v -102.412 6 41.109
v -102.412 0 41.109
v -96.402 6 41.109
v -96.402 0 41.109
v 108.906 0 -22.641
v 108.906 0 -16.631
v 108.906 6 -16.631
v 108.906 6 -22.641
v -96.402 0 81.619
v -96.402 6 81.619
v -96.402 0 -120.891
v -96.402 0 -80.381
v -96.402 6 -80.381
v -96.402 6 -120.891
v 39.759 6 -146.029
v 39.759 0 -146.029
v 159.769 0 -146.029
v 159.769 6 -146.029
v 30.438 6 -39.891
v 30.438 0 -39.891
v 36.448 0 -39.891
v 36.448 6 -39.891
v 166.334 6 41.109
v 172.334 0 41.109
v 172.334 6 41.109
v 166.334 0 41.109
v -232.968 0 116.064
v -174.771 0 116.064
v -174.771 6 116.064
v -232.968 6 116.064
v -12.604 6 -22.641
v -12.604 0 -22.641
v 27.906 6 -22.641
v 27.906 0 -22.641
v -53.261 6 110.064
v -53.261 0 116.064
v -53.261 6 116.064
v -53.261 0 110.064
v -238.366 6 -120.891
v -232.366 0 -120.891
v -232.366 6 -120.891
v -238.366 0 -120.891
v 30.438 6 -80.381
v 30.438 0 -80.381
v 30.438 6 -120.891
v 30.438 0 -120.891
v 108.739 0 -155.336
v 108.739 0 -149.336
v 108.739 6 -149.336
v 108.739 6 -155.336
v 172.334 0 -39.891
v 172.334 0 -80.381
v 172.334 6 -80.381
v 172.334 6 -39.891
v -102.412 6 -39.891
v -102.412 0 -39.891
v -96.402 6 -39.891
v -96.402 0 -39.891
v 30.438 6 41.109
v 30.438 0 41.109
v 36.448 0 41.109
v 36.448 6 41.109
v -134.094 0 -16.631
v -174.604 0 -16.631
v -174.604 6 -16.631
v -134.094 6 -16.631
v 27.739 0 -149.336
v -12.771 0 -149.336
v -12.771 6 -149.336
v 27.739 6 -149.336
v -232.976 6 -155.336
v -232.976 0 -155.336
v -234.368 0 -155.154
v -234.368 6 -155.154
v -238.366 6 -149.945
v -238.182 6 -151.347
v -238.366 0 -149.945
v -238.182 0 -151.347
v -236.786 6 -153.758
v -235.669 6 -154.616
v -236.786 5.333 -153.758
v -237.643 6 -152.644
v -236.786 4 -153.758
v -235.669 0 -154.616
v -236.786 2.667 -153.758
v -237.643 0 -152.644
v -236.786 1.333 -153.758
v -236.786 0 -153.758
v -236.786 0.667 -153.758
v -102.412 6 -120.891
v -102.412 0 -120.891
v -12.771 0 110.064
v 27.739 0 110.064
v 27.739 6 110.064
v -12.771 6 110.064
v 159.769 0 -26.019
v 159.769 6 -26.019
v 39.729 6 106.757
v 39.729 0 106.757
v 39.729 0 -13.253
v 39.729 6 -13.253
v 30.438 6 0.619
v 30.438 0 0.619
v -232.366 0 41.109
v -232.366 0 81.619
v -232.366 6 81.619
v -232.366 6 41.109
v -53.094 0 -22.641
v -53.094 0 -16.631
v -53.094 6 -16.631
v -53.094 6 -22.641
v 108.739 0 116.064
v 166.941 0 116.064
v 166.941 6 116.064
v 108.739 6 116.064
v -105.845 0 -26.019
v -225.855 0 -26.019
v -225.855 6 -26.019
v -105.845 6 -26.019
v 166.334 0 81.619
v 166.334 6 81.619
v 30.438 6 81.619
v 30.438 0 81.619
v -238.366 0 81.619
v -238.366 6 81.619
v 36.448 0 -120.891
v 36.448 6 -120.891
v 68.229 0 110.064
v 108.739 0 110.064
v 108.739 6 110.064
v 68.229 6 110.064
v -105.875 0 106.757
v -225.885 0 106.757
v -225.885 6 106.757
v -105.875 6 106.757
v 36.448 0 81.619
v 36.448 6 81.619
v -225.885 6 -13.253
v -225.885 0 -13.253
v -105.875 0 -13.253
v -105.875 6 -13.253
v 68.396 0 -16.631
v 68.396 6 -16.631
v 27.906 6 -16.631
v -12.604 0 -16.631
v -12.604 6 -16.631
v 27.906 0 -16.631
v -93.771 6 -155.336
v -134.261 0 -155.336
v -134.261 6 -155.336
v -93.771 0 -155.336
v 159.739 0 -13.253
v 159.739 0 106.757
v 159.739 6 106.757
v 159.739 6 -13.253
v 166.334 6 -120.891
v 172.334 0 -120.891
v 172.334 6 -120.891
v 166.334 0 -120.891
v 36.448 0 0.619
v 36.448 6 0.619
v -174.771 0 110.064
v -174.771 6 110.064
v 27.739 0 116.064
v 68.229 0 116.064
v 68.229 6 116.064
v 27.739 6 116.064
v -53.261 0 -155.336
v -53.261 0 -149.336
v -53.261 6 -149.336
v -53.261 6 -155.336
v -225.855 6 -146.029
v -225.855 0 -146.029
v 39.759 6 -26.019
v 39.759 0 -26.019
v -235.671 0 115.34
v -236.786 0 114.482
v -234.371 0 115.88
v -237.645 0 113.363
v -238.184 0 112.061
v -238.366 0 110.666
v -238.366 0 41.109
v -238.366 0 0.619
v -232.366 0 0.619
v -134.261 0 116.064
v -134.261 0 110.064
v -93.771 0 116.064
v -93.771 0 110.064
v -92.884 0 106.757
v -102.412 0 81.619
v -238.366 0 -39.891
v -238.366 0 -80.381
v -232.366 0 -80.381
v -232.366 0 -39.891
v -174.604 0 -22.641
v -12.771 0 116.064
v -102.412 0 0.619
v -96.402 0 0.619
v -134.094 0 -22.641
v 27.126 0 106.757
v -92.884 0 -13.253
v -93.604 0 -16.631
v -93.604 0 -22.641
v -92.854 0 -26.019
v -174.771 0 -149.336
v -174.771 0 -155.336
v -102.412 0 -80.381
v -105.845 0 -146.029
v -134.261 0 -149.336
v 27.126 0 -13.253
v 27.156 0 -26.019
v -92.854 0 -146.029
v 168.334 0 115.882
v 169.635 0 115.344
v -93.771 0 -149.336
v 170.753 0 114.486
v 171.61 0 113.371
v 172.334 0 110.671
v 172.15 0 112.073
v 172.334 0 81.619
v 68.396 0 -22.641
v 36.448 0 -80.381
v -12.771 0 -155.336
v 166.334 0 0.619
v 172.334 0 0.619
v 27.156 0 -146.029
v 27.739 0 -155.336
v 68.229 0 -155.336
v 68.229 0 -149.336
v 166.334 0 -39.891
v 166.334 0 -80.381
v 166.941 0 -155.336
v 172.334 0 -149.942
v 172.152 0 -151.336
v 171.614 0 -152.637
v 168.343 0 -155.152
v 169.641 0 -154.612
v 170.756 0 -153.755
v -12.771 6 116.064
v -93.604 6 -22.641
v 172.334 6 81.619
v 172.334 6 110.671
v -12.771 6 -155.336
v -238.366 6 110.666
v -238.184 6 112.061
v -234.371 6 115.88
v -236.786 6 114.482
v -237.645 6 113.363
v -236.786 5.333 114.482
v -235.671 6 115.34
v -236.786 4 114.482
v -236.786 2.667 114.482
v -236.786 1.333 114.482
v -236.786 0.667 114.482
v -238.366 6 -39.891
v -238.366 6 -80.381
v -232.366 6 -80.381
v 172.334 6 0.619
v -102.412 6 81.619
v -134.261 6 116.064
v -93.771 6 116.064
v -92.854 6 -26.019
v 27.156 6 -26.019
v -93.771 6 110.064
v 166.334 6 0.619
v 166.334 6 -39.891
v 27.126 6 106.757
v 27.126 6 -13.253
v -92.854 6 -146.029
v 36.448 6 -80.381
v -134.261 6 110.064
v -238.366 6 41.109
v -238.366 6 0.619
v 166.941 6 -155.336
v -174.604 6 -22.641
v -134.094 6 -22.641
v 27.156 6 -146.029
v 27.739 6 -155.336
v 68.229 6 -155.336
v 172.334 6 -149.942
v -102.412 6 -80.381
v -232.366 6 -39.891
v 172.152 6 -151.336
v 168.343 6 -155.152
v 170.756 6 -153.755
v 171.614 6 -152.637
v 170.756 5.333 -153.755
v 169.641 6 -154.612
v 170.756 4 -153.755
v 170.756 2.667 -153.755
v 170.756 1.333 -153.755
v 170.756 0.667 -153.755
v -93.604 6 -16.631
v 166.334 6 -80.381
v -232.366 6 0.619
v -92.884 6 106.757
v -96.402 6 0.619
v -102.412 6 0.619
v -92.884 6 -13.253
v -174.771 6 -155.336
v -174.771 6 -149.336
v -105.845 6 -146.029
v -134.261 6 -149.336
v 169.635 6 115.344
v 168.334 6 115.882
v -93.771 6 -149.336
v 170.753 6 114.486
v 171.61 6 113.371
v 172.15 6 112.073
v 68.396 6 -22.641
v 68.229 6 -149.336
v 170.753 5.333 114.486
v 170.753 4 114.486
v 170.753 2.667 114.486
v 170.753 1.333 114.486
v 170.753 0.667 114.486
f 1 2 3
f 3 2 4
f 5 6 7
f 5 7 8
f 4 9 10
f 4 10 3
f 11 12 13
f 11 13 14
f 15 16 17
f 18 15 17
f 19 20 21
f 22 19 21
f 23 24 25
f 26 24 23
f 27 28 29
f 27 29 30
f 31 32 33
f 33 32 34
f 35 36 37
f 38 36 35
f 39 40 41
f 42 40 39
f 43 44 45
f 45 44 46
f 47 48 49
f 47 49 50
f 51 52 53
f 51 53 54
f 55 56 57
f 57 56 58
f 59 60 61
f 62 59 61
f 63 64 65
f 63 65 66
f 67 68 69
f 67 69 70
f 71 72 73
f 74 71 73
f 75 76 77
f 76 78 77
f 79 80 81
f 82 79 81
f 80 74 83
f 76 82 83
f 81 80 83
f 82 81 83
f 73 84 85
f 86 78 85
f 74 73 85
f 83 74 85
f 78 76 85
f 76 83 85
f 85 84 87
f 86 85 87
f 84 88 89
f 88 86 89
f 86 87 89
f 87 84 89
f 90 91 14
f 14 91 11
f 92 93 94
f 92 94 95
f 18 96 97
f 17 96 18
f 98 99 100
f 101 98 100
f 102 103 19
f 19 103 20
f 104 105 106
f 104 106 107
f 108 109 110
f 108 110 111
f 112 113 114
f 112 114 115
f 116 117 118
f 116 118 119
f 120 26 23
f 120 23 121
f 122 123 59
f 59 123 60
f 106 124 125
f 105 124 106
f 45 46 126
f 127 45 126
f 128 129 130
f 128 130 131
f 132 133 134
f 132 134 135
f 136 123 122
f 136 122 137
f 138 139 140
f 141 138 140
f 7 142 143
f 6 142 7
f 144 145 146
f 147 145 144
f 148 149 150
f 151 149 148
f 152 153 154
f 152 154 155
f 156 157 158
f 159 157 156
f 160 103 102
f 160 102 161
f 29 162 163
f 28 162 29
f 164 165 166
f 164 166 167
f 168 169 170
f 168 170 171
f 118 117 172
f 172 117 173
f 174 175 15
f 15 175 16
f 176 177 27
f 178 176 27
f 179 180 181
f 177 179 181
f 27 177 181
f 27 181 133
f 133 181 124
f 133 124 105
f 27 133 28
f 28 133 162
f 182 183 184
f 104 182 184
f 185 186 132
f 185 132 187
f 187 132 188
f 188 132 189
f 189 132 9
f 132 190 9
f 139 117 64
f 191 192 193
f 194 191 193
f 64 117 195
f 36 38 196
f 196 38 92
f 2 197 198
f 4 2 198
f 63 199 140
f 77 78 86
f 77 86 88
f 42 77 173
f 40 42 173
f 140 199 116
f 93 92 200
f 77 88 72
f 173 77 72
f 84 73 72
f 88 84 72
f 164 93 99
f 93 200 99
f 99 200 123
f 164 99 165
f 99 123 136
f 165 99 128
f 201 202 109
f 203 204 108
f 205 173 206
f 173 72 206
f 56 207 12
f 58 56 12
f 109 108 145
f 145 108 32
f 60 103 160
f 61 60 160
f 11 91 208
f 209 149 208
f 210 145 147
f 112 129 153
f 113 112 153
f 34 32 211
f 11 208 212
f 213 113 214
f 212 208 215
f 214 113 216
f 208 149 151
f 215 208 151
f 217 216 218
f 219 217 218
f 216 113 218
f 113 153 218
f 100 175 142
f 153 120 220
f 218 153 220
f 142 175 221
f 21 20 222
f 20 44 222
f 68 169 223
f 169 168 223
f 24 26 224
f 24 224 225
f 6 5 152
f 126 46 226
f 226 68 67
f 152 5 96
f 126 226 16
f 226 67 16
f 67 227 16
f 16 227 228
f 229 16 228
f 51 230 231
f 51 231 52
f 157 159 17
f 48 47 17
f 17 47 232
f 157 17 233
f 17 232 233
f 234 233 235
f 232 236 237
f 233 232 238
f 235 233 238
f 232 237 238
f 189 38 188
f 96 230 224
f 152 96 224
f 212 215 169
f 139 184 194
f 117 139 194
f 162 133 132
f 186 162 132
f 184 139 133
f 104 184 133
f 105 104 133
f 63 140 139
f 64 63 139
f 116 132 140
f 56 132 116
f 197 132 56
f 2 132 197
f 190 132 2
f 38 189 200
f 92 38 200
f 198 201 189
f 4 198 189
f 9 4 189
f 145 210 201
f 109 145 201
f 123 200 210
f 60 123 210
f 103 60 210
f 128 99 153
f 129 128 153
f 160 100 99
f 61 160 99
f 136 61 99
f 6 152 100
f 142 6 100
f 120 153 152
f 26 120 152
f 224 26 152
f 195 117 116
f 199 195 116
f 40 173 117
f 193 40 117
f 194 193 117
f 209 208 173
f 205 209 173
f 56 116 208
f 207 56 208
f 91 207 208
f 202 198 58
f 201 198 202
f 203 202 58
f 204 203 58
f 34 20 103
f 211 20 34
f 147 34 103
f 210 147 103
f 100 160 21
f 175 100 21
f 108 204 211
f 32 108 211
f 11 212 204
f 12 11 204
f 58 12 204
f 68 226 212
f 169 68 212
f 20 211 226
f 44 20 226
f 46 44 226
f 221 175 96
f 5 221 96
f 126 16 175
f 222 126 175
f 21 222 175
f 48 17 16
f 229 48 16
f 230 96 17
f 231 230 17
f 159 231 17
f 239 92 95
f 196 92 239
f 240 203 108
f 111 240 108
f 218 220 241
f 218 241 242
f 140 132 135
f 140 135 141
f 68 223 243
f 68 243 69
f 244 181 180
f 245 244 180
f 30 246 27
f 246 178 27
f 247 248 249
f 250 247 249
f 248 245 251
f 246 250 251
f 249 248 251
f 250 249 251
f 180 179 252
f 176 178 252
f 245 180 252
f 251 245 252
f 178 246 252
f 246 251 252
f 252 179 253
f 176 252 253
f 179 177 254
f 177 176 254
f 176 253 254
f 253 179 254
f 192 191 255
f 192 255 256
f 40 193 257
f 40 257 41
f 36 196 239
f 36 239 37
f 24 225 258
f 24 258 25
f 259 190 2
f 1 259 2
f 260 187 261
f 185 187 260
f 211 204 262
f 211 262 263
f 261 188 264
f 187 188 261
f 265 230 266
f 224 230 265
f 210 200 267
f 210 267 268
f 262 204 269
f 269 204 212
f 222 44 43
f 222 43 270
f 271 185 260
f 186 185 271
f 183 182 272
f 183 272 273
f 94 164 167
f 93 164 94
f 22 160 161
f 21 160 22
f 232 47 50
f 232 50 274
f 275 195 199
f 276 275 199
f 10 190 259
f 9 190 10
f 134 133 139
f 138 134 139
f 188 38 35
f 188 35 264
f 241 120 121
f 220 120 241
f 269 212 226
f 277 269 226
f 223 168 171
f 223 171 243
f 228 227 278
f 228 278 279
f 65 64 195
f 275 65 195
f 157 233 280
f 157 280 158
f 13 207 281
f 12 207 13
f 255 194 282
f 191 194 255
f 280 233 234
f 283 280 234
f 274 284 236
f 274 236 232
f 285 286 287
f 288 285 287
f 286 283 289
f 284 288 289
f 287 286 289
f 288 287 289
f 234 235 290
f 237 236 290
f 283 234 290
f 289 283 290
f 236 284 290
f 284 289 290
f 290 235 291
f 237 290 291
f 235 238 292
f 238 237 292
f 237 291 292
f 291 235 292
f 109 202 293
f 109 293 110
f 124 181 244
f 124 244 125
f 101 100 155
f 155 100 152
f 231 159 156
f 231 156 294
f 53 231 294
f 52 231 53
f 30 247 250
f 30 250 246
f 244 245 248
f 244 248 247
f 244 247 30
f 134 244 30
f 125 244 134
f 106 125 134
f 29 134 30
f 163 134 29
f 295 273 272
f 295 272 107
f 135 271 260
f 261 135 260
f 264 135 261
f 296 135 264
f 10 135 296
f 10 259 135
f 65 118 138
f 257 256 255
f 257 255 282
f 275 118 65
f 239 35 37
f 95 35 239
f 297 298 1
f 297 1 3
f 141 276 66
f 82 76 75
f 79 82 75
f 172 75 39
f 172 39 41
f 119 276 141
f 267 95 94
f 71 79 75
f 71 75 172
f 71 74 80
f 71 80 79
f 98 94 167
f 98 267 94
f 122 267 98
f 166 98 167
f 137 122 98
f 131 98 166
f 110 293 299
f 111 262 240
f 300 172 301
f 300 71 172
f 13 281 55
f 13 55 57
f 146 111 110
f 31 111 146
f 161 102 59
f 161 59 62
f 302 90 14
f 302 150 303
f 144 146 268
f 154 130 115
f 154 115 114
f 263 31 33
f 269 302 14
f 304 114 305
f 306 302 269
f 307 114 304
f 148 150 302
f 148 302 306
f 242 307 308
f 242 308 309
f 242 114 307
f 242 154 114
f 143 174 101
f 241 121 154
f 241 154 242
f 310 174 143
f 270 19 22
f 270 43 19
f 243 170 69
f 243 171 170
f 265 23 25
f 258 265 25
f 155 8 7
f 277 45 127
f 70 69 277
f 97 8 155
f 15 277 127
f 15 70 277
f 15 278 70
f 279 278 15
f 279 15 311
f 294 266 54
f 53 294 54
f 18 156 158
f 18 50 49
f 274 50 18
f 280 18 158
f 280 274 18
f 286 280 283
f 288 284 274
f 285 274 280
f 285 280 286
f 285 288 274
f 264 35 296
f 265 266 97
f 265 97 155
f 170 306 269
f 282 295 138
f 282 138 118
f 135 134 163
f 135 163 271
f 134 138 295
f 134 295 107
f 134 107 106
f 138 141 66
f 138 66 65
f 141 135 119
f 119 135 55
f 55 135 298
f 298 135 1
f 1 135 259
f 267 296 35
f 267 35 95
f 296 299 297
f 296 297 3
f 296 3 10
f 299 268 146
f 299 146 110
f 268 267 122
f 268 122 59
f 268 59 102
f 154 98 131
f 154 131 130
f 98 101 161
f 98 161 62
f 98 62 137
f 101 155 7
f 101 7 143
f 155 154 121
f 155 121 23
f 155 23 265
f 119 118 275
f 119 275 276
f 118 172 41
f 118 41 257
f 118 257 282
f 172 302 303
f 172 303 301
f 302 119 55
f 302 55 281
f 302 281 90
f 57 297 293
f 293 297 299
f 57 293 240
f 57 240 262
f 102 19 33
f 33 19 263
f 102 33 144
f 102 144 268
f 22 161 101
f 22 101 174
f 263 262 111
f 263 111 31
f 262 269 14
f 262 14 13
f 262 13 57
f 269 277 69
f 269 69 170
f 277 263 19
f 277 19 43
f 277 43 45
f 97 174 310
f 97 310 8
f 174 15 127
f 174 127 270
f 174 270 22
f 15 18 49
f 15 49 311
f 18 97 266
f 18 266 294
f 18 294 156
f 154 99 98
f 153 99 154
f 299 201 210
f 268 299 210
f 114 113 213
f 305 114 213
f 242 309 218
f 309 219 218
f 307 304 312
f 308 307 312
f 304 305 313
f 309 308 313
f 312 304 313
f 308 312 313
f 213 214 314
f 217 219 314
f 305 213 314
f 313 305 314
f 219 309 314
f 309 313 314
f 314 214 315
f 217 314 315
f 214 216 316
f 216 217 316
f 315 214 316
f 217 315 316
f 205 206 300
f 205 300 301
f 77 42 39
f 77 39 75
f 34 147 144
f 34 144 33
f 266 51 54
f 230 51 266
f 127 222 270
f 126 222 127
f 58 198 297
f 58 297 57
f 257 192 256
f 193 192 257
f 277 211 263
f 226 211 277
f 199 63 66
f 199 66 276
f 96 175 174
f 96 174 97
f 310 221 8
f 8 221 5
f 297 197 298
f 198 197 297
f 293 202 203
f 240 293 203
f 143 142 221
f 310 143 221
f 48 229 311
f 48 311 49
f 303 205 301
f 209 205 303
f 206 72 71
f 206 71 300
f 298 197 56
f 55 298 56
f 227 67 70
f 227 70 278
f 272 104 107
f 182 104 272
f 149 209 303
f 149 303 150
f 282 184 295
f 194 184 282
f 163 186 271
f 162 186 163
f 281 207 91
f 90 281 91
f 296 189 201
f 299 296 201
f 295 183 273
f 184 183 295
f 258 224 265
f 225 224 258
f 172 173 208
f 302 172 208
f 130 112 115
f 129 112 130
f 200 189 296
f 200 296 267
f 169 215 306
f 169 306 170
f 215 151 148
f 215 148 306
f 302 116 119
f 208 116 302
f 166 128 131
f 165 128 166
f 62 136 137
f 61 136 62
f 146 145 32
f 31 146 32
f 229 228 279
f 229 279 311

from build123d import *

# Parameters (mm, degrees)
SKETCH1_W                     = 600
SKETCH1_H                     = 400
BOSS_EXTRUDE1_DEPTH           = 6
CUT_EXTRUDE_THIN1_START       = -6
CUT_EXTRUDE_THIN1_OUTLINE_W   = 600
CUT_EXTRUDE_THIN1_OUTLINE_H   = 400
CUT_EXTRUDE_THIN1_OUTLINE_W_2 = 120.00999997
CUT_EXTRUDE_THIN1_OUTLINE_H_2 = 120.00999997
CUT_EXTRUDE_THIN1_OUTLINE_W_3 = 6.010030683
CUT_EXTRUDE_THIN1_OUTLINE_H_3 = 40.510001116
CUT_EXTRUDE_THIN1_OUTLINE_H_4 = 40.510001117
CUT_EXTRUDE_THIN1_OUTLINE_W_4 = 40.510001117
CUT_EXTRUDE_THIN1_OUTLINE_H_5 = 6.010000165
CUT_EXTRUDE_THIN1_OUTLINE_W_5 = 40.510001116
CUT_EXTRUDE_THIN1_DEPTH       = 6


# Read off the part's stored shape, not the designer's step: Cut-Extrude-Thin1
with BuildPart() as part:
    # Sketch1 → Boss-Extrude1 (new body)
    with BuildSketch(Plane(origin=(0, 0, 0), x_dir=(1, 0, 0), z_dir=(0, 1, 0))):
        Rectangle(SKETCH1_W, SKETCH1_H)
    extrude(amount=BOSS_EXTRUDE1_DEPTH)

    # Cut-Extrude-Thin1 outline → Cut-Extrude-Thin1 (cut)
    # profile 1 of 17: a face of its own
    with BuildSketch(Plane(origin=(0, 6, 0), x_dir=(1, 0, 0), z_dir=(0, 1, 0)).offset(CUT_EXTRUDE_THIN1_START)):
        Rectangle(CUT_EXTRUDE_THIN1_OUTLINE_W, CUT_EXTRUDE_THIN1_OUTLINE_H)
        with BuildLine():
            add(Edge.make_bspline(
                [(-238.36591917, -110.666330439), (-238.36591917, -111.022718254), (-238.331611138, -111.373302275), (-238.229439172, -111.890599849), (-238.186888618, -112.061595598), (-238.084359635, -112.40063887), (-238.024094249, -112.569133555), (-237.820904778, -113.059142484), (-237.654940907, -113.36891683), (-237.263040055, -113.955242515), (-237.035095444, -114.232830805), (-236.537438909, -114.730832851), (-236.266010557, -114.954536306), (-235.676648855, -115.349887512), (-235.363009478, -115.517926842), (-234.714230084, -115.787625448), (-234.374802575, -115.891216057), (-233.677199742, -116.029834842), (-233.324541074, -116.06414949), (-232.96810012, -116.06414949)],
                knots=[0, 0, 0, 0, 0.125, 0.125, 0.1875, 0.1875, 0.25, 0.25, 0.375, 0.375, 0.5, 0.5, 0.625, 0.625, 0.75, 0.75, 0.875, 0.875, 1, 1, 1, 1], degree=3))
            Line((-238.36591917, -110.666330439), (-238.36591917, -81.619146709))
            Line((-238.36591917, -81.619146709), (-232.365919004, -81.619146709))
            Line((-232.365919004, -81.619146709), (-232.365919004, -41.109145592))
            Line((-232.365919004, -41.109145592), (-238.36591917, -41.109145592))
            Line((-238.36591917, -41.109145592), (-238.36591917, -0.619144476))
            Line((-238.36591917, -0.619144476), (-232.365919004, -0.619144476))
            Line((-232.365919004, -0.619144476), (-232.365919004, 39.890856641))
            Line((-232.365919004, 39.890856641), (-238.36591917, 39.890856641))
            Line((-238.36591917, 39.890856641), (-238.36591917, 80.380857757))
            Line((-238.36591917, 80.380857757), (-232.365919004, 80.380857757))
            Line((-232.365919004, 80.380857757), (-232.365919004, 120.890858873))
            Line((-232.365919004, 120.890858873), (-238.36591917, 120.890858873))
            Line((-238.36591917, 120.890858873), (-238.36591917, 149.945450012))
            add(Edge.make_bspline(
                [(-232.975507527, 155.335861654), (-233.331406272, 155.335861654), (-233.681509188, 155.301600704), (-234.198096877, 155.199568948), (-234.368857969, 155.157076787), (-234.707435973, 155.054688504), (-234.875699433, 154.99450582), (-235.365035925, 154.791595185), (-235.674385168, 154.625859065), (-236.259906241, 154.234496016), (-236.537113597, 154.006864213), (-237.034432237, 153.50989061), (-237.257828705, 153.238834738), (-237.652637373, 152.650281815), (-237.820446103, 152.337072845), (-238.089774603, 151.689183769), (-238.193223055, 151.350222055), (-238.331651613, 150.653576539), (-238.36591917, 150.301401824), (-238.36591917, 149.945450012)],
                knots=[0, 0, 0, 0, 0.125, 0.125, 0.1875, 0.1875, 0.25, 0.25, 0.375, 0.375, 0.5, 0.5, 0.625, 0.625, 0.75, 0.75, 0.875, 0.875, 1, 1, 1, 1], degree=3))
            Line((-232.975507527, 155.335861654), (-174.770917874, 155.335861654))
            Line((-174.770917874, 155.335861654), (-174.770917874, 149.335861489))
            Line((-174.770917874, 149.335861489), (-134.260912943, 149.335861489))
            Line((-134.260912943, 149.335861489), (-134.260912943, 155.335861654))
            Line((-134.260912943, 155.335861654), (-93.770919456, 155.335861654))
            Line((-93.770919456, 155.335861654), (-93.770919456, 149.335861489))
            Line((-93.770919456, 149.335861489), (-53.26091834, 149.335861489))
            Line((-53.26091834, 149.335861489), (-53.26091834, 155.335861654))
            Line((-53.26091834, 155.335861654), (-12.770917223, 155.335861654))
            Line((-12.770917223, 155.335861654), (-12.770917223, 149.335861489))
            Line((-12.770917223, 149.335861489), (27.739099152, 149.335861489))
            Line((27.739099152, 149.335861489), (27.739099152, 155.335861654))
            Line((27.739099152, 155.335861654), (68.229100268, 155.335861654))
            Line((68.229100268, 155.335861654), (68.229100268, 149.335861489))
            Line((68.229100268, 149.335861489), (108.739101385, 149.335861489))
            Line((108.739101385, 149.335861489), (108.739101385, 155.335861654))
            Line((108.739101385, 155.335861654), (166.94069191, 155.335861654))
            add(Edge.make_bspline(
                [(172.334083607, 149.942469958), (172.334083607, 150.298565459), (172.299803715, 150.648861927), (172.197715552, 151.165735208), (172.155199899, 151.336590704), (172.052755011, 151.675355888), (171.992539056, 151.843712372), (171.789516243, 152.33331939), (171.623688497, 152.642839656), (171.232109086, 153.22868443), (171.004351438, 153.506045038), (170.507103087, 154.003638617), (170.235897363, 154.227158588), (169.647019062, 154.622185524), (169.333636936, 154.790087026), (168.685389679, 155.059564422), (168.346240572, 155.163070064), (167.649209921, 155.301575153), (167.296840508, 155.335861654), (166.94069191, 155.335861654)],
                knots=[0, 0, 0, 0, 0.125, 0.125, 0.1875, 0.1875, 0.25, 0.25, 0.375, 0.375, 0.5, 0.5, 0.625, 0.625, 0.75, 0.75, 0.875, 0.875, 1, 1, 1, 1], degree=3))
            Line((172.334083607, 149.942469958), (172.334083607, 120.890858873))
            Line((172.334083607, 120.890858873), (166.334083441, 120.890858873))
            Line((166.334083441, 120.890858873), (166.334083441, 80.380857757))
            Line((166.334083441, 80.380857757), (172.334083607, 80.380857757))
            Line((172.334083607, 80.380857757), (172.334083607, 39.890856641))
            Line((172.334083607, 39.890856641), (166.334083441, 39.890856641))
            Line((166.334083441, 39.890856641), (166.334083441, -0.619144476))
            Line((166.334083441, -0.619144476), (172.334083607, -0.619144476))
            Line((172.334083607, -0.619144476), (172.334083607, -41.109145592))
            Line((172.334083607, -41.109145592), (166.334083441, -41.109145592))
            Line((166.334083441, -41.109145592), (166.334083441, -81.619146709))
            Line((166.334083441, -81.619146709), (172.334083607, -81.619146709))
            Line((172.334083607, -81.619146709), (172.334083607, -110.670699923))
            add(Edge.make_bspline(
                [(166.94063404, -116.06414949), (167.296733362, -116.06414949), (167.647033588, -116.02986923), (168.163912416, -115.927779971), (168.334769745, -115.885263862), (168.673538564, -115.782817875), (168.841896854, -115.722601274), (169.331509126, -115.519576283), (169.641032712, -115.353746757), (170.226883772, -114.962163145), (170.504247357, -114.734403053), (171.001846275, -114.237149366), (171.225368645, -113.965940733), (171.620399819, -113.377056114), (171.788303122, -113.063670625), (172.05778341, -112.415416412), (172.161290163, -112.076263666), (172.299796737, -111.379225535), (172.334083607, -111.026852342), (172.334083607, -110.670699923)],
                knots=[0, 0, 0, 0, 0.125, 0.125, 0.1875, 0.1875, 0.25, 0.25, 0.375, 0.375, 0.5, 0.5, 0.625, 0.625, 0.75, 0.75, 0.875, 0.875, 1, 1, 1, 1], degree=3))
            Line((166.94063404, -116.06414949), (108.739101385, -116.06414949))
            Line((108.739101385, -116.06414949), (108.739101385, -110.064149324))
            Line((108.739101385, -110.064149324), (68.229100268, -110.064149324))
            Line((68.229100268, -110.064149324), (68.229100268, -116.06414949))
            Line((68.229100268, -116.06414949), (27.739099152, -116.06414949))
            Line((27.739099152, -116.06414949), (27.739099152, -110.064149324))
            Line((27.739099152, -110.064149324), (-12.770917223, -110.064149324))
            Line((-12.770917223, -110.064149324), (-12.770917223, -116.06414949))
            Line((-12.770917223, -116.06414949), (-53.26091834, -116.06414949))
            Line((-53.26091834, -116.06414949), (-53.26091834, -110.064149324))
            Line((-53.26091834, -110.064149324), (-93.770919456, -110.064149324))
            Line((-93.770919456, -110.064149324), (-93.770919456, -116.06414949))
            Line((-93.770919456, -116.06414949), (-134.260912943, -116.06414949))
            Line((-134.260912943, -116.06414949), (-134.260912943, -110.064149324))
            Line((-134.260912943, -110.064149324), (-174.770917874, -110.064149324))
            Line((-174.770917874, -110.064149324), (-174.770917874, -116.06414949))
            Line((-174.770917874, -116.06414949), (-232.96810012, -116.06414949))
        make_face(mode=Mode.SUBTRACT)
    # profile 2 of 17: a face of its own
    with BuildSketch(Plane(origin=(0, 6, 0), x_dir=(1, 0, 0), z_dir=(0, 1, 0)).offset(CUT_EXTRUDE_THIN1_START)):
        with Locations((99.734498143, -46.752338346)):
            Rectangle(CUT_EXTRUDE_THIN1_OUTLINE_W_2, CUT_EXTRUDE_THIN1_OUTLINE_H_2)
    # profile 3 of 17: a face of its own
    with BuildSketch(Plane(origin=(0, 6, 0), x_dir=(1, 0, 0), z_dir=(0, 1, 0)).offset(CUT_EXTRUDE_THIN1_START)):
        with Locations((-32.878833462, -46.752338346)):
            Rectangle(CUT_EXTRUDE_THIN1_OUTLINE_W_2, CUT_EXTRUDE_THIN1_OUTLINE_H_2)
    # profile 4 of 17: a face of its own
    with BuildSketch(Plane(origin=(0, 6, 0), x_dir=(1, 0, 0), z_dir=(0, 1, 0)).offset(CUT_EXTRUDE_THIN1_START)):
        with Locations((-165.879682281, -46.752338346)):
            Rectangle(CUT_EXTRUDE_THIN1_OUTLINE_W_2, CUT_EXTRUDE_THIN1_OUTLINE_H_2)
    # profile 5 of 17: a face of its own
    with BuildSketch(Plane(origin=(0, 6, 0), x_dir=(1, 0, 0), z_dir=(0, 1, 0)).offset(CUT_EXTRUDE_THIN1_START)):
        with Locations((33.442531415, 100.635858315)):
            Rectangle(CUT_EXTRUDE_THIN1_OUTLINE_W_3, CUT_EXTRUDE_THIN1_OUTLINE_H_3)
    # profile 6 of 17: a face of its own
    with BuildSketch(Plane(origin=(0, 6, 0), x_dir=(1, 0, 0), z_dir=(0, 1, 0)).offset(CUT_EXTRUDE_THIN1_START)):
        with Locations((33.442531415, 19.635856082)):
            Rectangle(CUT_EXTRUDE_THIN1_OUTLINE_W_3, CUT_EXTRUDE_THIN1_OUTLINE_H_4)
    # profile 7 of 17: a face of its own
    with BuildSketch(Plane(origin=(0, 6, 0), x_dir=(1, 0, 0), z_dir=(0, 1, 0)).offset(CUT_EXTRUDE_THIN1_START)):
        with Locations((33.442531415, -61.364146151)):
            Rectangle(CUT_EXTRUDE_THIN1_OUTLINE_W_3, CUT_EXTRUDE_THIN1_OUTLINE_H_4)
    # profile 8 of 17: a face of its own
    with BuildSketch(Plane(origin=(0, 6, 0), x_dir=(1, 0, 0), z_dir=(0, 1, 0)).offset(CUT_EXTRUDE_THIN1_START)):
        with Locations((-99.406534011, -61.363913878)):
            Rectangle(CUT_EXTRUDE_THIN1_OUTLINE_W_3, CUT_EXTRUDE_THIN1_OUTLINE_H_3)
    # profile 9 of 17: a face of its own
    with BuildSketch(Plane(origin=(0, 6, 0), x_dir=(1, 0, 0), z_dir=(0, 1, 0)).offset(CUT_EXTRUDE_THIN1_START)):
        with Locations((-99.406534011, 19.636088355)):
            Rectangle(CUT_EXTRUDE_THIN1_OUTLINE_W_3, CUT_EXTRUDE_THIN1_OUTLINE_H_3)
    # profile 10 of 17: a face of its own
    with BuildSketch(Plane(origin=(0, 6, 0), x_dir=(1, 0, 0), z_dir=(0, 1, 0)).offset(CUT_EXTRUDE_THIN1_START)):
        with Locations((-99.406534011, 100.636090588)):
            Rectangle(CUT_EXTRUDE_THIN1_OUTLINE_W_3, CUT_EXTRUDE_THIN1_OUTLINE_H_3)
    # profile 11 of 17: a face of its own
    with BuildSketch(Plane(origin=(0, 6, 0), x_dir=(1, 0, 0), z_dir=(0, 1, 0)).offset(CUT_EXTRUDE_THIN1_START)):
        with Locations((-73.349436431, 19.635856083)):
            Rectangle(CUT_EXTRUDE_THIN1_OUTLINE_W_4, CUT_EXTRUDE_THIN1_OUTLINE_H_5)
    # profile 12 of 17: a face of its own
    with BuildSketch(Plane(origin=(0, 6, 0), x_dir=(1, 0, 0), z_dir=(0, 1, 0)).offset(CUT_EXTRUDE_THIN1_START)):
        with Locations((-154.349438663, 19.635856083)):
            Rectangle(CUT_EXTRUDE_THIN1_OUTLINE_W_5, CUT_EXTRUDE_THIN1_OUTLINE_H_5)
    # profile 13 of 17: a face of its own
    with BuildSketch(Plane(origin=(0, 6, 0), x_dir=(1, 0, 0), z_dir=(0, 1, 0)).offset(CUT_EXTRUDE_THIN1_START)):
        with Locations((88.650568035, 19.635856083)):
            Rectangle(CUT_EXTRUDE_THIN1_OUTLINE_W_5, CUT_EXTRUDE_THIN1_OUTLINE_H_5)
    # profile 14 of 17: a face of its own
    with BuildSketch(Plane(origin=(0, 6, 0), x_dir=(1, 0, 0), z_dir=(0, 1, 0)).offset(CUT_EXTRUDE_THIN1_START)):
        with Locations((7.650565803, 19.635856083)):
            Rectangle(CUT_EXTRUDE_THIN1_OUTLINE_W_4, CUT_EXTRUDE_THIN1_OUTLINE_H_5)
    # profile 15 of 17: a face of its own
    with BuildSketch(Plane(origin=(0, 6, 0), x_dir=(1, 0, 0), z_dir=(0, 1, 0)).offset(CUT_EXTRUDE_THIN1_START)):
        with Locations((-32.849435314, 86.02405051)):
            Rectangle(CUT_EXTRUDE_THIN1_OUTLINE_W_2, CUT_EXTRUDE_THIN1_OUTLINE_H_2)
    # profile 16 of 17: a face of its own
    with BuildSketch(Plane(origin=(0, 6, 0), x_dir=(1, 0, 0), z_dir=(0, 1, 0)).offset(CUT_EXTRUDE_THIN1_START)):
        with Locations((99.763896291, 86.02405051)):
            Rectangle(CUT_EXTRUDE_THIN1_OUTLINE_W_2, CUT_EXTRUDE_THIN1_OUTLINE_H_2)
    # profile 17 of 17: a face of its own
    with BuildSketch(Plane(origin=(0, 6, 0), x_dir=(1, 0, 0), z_dir=(0, 1, 0)).offset(CUT_EXTRUDE_THIN1_START)):
        with Locations((-165.850284133, 86.02405051)):
            Rectangle(CUT_EXTRUDE_THIN1_OUTLINE_W_2, CUT_EXTRUDE_THIN1_OUTLINE_H_2)
    extrude(amount=CUT_EXTRUDE_THIN1_DEPTH, mode=Mode.SUBTRACT)


solid = part.part
